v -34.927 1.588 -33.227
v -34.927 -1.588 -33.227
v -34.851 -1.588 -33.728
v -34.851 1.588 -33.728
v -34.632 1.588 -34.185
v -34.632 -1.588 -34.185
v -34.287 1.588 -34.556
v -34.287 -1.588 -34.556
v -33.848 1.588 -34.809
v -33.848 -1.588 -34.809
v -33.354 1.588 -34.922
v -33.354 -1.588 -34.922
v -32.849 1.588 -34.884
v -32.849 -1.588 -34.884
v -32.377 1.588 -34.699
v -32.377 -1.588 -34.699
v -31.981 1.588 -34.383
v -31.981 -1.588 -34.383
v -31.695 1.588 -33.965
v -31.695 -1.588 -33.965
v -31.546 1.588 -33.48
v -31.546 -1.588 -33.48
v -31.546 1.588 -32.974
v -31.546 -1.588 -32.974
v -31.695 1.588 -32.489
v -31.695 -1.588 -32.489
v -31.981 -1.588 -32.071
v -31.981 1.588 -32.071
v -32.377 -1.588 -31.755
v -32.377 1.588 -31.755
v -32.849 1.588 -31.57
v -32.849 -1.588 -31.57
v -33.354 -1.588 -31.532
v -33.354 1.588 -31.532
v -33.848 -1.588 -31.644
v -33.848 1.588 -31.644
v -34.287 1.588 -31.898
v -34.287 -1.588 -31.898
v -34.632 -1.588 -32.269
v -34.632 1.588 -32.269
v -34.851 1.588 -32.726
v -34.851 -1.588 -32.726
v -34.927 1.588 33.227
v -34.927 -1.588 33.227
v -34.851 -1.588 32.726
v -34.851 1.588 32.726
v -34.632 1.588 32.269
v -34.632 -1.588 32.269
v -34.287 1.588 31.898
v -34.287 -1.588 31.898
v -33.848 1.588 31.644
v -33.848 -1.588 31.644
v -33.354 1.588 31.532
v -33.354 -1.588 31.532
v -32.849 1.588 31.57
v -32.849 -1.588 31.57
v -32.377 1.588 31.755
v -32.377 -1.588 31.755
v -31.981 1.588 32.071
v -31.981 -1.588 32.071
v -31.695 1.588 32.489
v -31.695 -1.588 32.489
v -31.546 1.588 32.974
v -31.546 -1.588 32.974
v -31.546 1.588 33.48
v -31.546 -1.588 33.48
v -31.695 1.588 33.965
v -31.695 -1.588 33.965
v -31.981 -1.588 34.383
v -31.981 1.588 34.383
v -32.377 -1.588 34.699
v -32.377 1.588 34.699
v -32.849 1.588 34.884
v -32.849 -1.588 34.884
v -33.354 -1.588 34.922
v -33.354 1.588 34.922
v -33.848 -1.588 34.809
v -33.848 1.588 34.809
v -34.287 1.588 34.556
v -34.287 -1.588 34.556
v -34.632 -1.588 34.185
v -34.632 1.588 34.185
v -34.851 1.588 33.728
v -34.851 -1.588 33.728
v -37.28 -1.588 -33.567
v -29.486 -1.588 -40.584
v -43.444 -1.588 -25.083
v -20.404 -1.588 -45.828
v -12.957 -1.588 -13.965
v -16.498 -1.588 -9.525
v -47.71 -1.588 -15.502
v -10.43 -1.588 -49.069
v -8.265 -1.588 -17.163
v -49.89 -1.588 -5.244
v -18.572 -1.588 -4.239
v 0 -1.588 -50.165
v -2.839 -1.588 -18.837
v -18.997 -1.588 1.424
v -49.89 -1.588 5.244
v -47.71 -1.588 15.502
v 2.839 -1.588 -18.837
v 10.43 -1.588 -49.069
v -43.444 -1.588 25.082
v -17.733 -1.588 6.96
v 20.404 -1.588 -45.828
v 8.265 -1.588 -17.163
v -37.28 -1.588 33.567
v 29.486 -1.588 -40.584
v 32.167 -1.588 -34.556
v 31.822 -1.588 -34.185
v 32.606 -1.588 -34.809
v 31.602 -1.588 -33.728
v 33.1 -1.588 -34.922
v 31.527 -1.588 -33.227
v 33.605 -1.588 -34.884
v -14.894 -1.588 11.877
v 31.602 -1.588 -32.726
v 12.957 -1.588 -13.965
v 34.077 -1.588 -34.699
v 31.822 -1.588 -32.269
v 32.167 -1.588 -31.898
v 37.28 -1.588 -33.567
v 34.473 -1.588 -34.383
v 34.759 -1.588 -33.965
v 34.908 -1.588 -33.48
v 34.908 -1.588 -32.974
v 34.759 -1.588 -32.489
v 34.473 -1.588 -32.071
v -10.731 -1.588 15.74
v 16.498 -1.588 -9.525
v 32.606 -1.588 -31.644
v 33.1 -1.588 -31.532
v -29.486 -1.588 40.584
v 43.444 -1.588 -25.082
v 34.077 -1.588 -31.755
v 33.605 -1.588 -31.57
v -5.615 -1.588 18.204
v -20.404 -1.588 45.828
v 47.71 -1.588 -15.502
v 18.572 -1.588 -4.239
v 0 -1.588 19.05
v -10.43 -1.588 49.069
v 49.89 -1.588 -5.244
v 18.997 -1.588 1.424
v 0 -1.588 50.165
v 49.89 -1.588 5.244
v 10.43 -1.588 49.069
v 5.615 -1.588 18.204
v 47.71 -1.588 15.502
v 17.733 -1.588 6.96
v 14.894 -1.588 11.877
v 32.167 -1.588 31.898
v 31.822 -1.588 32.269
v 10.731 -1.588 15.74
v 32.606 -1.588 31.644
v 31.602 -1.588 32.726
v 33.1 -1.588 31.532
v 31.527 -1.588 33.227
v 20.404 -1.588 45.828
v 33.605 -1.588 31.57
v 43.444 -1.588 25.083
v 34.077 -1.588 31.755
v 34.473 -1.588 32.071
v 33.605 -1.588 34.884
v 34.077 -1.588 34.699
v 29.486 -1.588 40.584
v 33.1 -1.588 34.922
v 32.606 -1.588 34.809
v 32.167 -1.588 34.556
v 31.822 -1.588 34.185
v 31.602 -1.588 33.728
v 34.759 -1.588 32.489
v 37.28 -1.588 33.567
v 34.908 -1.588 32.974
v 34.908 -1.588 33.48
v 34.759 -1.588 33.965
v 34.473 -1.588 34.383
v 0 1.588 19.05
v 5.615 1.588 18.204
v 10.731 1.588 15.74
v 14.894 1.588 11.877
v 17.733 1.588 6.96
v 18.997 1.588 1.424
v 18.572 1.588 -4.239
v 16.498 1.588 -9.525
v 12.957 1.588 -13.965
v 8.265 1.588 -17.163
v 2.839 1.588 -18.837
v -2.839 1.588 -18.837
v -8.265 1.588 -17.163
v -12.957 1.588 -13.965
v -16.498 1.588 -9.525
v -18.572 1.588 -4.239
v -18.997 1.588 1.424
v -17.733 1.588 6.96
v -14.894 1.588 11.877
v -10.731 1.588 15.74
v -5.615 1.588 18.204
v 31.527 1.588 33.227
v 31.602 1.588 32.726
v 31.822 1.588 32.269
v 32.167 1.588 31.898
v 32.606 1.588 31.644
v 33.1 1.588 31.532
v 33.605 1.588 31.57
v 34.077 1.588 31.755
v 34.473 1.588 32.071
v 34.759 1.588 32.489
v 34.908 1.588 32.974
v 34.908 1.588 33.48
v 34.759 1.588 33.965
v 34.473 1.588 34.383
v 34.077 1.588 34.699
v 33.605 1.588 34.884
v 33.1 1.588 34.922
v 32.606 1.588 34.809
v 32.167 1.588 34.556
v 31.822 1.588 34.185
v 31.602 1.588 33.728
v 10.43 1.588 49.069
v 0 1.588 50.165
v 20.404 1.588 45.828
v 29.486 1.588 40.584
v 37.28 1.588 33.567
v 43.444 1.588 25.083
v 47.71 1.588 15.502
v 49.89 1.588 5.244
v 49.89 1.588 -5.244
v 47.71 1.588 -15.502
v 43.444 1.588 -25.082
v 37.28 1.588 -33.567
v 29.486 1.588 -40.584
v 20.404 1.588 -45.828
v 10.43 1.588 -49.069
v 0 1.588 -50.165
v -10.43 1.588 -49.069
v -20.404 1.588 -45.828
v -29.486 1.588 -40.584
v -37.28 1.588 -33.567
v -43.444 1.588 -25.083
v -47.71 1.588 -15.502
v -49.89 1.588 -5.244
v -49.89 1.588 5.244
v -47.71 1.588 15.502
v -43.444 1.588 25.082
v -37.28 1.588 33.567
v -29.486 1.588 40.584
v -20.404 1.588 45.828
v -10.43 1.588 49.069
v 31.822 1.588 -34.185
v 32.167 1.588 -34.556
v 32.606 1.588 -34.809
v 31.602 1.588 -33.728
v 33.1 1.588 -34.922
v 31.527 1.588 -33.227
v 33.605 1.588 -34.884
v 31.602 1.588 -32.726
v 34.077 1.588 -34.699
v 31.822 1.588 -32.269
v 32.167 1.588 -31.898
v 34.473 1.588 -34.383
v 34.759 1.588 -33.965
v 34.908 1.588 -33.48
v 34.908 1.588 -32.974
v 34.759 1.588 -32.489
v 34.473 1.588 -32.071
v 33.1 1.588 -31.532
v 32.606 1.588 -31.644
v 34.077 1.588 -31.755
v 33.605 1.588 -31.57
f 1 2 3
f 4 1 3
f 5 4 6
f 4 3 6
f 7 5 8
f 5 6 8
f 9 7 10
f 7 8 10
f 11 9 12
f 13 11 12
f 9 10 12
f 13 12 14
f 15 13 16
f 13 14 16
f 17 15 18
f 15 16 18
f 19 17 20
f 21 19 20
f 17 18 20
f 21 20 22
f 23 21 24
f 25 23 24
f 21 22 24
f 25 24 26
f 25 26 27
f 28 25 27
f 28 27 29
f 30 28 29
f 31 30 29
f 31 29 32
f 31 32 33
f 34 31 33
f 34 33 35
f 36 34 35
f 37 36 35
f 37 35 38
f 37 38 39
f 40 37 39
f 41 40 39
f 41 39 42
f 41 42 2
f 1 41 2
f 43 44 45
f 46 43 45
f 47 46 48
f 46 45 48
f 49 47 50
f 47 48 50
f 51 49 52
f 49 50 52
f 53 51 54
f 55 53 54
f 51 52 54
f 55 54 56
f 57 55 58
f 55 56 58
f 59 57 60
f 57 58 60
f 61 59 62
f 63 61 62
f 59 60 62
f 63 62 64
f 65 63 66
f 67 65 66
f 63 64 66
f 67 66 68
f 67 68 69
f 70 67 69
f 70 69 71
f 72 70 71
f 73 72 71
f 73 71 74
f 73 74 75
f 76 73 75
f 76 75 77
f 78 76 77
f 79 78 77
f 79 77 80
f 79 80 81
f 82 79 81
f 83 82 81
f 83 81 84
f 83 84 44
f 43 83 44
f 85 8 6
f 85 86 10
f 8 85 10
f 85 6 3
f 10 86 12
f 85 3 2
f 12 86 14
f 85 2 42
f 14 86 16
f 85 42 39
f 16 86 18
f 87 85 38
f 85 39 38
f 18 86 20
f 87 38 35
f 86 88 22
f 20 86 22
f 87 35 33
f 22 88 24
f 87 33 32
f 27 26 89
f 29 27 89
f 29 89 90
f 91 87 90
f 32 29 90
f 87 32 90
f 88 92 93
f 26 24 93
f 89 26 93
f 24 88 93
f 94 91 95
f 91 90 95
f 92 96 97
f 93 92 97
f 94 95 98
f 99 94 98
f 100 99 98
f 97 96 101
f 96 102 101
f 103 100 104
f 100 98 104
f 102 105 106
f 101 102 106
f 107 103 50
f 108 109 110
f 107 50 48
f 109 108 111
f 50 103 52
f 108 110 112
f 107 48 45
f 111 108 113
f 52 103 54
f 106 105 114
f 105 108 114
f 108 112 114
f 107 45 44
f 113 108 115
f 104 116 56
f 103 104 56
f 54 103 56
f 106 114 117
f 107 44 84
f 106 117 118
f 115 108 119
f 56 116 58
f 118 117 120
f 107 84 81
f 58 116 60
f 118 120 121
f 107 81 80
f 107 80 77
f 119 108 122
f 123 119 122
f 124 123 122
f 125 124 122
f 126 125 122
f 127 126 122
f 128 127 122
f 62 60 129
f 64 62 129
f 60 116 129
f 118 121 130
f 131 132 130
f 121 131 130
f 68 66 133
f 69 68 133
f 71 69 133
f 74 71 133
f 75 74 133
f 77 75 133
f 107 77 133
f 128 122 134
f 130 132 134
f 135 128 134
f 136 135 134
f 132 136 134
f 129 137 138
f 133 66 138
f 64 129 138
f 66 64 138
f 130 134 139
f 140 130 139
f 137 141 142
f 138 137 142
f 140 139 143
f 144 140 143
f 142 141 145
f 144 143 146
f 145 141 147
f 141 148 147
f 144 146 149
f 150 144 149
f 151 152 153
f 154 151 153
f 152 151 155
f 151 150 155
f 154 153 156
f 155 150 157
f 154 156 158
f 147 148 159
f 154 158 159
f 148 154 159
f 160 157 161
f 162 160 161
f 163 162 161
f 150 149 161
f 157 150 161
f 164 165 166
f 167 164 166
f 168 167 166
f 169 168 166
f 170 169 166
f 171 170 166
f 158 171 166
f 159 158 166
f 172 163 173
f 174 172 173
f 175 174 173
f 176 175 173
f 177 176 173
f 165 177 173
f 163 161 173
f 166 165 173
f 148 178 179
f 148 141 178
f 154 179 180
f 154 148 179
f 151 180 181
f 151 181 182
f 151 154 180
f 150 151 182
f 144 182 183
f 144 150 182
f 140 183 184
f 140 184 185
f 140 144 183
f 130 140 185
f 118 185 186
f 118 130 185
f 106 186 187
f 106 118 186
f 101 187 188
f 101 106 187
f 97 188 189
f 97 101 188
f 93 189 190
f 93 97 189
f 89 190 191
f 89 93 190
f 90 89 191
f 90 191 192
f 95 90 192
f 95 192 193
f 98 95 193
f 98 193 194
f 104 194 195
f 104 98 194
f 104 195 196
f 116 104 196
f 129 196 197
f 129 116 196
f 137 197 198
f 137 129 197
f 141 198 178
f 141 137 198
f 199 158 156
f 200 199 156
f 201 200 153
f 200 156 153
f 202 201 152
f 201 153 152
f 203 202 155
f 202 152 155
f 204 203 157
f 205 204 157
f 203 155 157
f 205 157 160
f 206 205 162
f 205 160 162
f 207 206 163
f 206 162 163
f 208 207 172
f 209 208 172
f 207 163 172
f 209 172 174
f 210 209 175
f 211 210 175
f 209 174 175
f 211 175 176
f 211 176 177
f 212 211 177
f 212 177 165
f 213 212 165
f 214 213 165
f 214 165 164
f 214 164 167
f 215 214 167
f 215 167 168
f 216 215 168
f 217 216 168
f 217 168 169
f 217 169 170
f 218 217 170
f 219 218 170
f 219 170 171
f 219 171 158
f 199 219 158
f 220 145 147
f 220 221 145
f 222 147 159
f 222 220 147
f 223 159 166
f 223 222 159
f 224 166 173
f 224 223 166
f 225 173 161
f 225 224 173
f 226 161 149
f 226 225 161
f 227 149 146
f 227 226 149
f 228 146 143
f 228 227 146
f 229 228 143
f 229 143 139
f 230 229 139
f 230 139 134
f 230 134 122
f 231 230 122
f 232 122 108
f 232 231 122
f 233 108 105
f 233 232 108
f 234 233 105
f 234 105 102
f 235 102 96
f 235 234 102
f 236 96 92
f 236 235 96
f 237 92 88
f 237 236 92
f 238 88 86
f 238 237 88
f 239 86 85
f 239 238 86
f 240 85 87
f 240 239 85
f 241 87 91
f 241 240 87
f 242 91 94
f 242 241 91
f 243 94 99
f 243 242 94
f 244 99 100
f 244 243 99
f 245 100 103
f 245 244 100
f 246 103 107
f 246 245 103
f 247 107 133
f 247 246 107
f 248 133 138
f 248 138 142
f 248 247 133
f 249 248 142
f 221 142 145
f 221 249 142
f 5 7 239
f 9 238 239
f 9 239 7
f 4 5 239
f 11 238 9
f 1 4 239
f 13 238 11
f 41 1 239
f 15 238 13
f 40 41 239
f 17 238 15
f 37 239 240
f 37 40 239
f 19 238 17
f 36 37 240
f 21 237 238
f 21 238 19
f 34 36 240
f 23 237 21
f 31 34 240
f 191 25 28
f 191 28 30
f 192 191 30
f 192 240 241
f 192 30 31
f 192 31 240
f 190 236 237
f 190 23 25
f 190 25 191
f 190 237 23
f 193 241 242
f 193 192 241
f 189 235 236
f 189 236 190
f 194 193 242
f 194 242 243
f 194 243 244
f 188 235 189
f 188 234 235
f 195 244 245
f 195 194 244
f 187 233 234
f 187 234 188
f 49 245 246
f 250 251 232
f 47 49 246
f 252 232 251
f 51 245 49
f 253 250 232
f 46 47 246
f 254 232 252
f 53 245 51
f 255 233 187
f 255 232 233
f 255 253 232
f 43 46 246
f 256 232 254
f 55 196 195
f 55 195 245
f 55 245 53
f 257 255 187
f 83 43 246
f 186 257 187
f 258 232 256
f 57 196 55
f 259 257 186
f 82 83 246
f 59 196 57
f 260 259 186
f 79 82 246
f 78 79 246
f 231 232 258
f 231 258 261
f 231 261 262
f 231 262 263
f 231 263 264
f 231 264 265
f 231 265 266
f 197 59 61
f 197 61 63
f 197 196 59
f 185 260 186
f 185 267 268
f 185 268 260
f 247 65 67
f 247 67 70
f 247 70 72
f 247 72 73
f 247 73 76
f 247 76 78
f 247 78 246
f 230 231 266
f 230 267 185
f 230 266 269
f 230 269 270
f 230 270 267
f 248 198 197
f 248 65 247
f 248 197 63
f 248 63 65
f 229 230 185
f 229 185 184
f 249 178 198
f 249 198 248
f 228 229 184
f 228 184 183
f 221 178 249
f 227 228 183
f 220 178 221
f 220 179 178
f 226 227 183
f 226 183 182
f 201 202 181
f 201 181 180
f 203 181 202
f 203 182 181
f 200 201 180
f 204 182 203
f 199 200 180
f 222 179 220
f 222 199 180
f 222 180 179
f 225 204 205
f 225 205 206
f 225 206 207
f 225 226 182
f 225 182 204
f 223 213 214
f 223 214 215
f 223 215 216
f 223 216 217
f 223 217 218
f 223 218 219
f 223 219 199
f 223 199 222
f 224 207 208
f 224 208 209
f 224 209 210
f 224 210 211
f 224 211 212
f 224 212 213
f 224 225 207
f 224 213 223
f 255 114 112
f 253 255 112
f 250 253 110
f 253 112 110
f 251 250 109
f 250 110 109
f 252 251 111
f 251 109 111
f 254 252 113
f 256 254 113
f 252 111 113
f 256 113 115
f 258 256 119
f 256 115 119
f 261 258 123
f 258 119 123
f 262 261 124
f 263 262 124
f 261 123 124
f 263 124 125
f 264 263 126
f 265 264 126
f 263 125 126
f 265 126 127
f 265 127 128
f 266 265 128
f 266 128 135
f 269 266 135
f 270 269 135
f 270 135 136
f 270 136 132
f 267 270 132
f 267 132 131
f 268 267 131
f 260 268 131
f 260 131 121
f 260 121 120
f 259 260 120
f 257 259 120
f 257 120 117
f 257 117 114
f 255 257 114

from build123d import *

# Parameters (mm, degrees)
SKETCH1_R            = 50.165
SKETCH1_R_2          = 19.05
BOSS_EXTRUDE1_DEPTH  = 1.5875
M3_CLEARANCE_HOLE1_D = 3.4


with BuildPart() as part:
    # Sketch1 → Boss-Extrude1 (new, symmetric)
    with BuildSketch(Plane(origin=(0, 0, 0), x_dir=(1, 0, 0), z_dir=(0, 1, 0))):
        with Locations(Location((0, 0, 0), (0, 0, 270))):
            Circle(SKETCH1_R)
        with Locations(Location((0, 0, 0), (0, 0, 270))):
            Circle(SKETCH1_R_2, mode=Mode.SUBTRACT)
    extrude(amount=BOSS_EXTRUDE1_DEPTH, both=True)

    # M3 Clearance Hole1 (through all)
    with Locations(Plane(origin=(0, 1.5875, 0), x_dir=(1, 0, 0), z_dir=(0, 1, 0))):
        with Locations((-33.226947648, -33.226947648), (-33.226947648, 33.226947648), (33.226947648, 33.226947648), (33.226947648, -33.226947648)):
            Hole(M3_CLEARANCE_HOLE1_D / 2)


solid = part.part
